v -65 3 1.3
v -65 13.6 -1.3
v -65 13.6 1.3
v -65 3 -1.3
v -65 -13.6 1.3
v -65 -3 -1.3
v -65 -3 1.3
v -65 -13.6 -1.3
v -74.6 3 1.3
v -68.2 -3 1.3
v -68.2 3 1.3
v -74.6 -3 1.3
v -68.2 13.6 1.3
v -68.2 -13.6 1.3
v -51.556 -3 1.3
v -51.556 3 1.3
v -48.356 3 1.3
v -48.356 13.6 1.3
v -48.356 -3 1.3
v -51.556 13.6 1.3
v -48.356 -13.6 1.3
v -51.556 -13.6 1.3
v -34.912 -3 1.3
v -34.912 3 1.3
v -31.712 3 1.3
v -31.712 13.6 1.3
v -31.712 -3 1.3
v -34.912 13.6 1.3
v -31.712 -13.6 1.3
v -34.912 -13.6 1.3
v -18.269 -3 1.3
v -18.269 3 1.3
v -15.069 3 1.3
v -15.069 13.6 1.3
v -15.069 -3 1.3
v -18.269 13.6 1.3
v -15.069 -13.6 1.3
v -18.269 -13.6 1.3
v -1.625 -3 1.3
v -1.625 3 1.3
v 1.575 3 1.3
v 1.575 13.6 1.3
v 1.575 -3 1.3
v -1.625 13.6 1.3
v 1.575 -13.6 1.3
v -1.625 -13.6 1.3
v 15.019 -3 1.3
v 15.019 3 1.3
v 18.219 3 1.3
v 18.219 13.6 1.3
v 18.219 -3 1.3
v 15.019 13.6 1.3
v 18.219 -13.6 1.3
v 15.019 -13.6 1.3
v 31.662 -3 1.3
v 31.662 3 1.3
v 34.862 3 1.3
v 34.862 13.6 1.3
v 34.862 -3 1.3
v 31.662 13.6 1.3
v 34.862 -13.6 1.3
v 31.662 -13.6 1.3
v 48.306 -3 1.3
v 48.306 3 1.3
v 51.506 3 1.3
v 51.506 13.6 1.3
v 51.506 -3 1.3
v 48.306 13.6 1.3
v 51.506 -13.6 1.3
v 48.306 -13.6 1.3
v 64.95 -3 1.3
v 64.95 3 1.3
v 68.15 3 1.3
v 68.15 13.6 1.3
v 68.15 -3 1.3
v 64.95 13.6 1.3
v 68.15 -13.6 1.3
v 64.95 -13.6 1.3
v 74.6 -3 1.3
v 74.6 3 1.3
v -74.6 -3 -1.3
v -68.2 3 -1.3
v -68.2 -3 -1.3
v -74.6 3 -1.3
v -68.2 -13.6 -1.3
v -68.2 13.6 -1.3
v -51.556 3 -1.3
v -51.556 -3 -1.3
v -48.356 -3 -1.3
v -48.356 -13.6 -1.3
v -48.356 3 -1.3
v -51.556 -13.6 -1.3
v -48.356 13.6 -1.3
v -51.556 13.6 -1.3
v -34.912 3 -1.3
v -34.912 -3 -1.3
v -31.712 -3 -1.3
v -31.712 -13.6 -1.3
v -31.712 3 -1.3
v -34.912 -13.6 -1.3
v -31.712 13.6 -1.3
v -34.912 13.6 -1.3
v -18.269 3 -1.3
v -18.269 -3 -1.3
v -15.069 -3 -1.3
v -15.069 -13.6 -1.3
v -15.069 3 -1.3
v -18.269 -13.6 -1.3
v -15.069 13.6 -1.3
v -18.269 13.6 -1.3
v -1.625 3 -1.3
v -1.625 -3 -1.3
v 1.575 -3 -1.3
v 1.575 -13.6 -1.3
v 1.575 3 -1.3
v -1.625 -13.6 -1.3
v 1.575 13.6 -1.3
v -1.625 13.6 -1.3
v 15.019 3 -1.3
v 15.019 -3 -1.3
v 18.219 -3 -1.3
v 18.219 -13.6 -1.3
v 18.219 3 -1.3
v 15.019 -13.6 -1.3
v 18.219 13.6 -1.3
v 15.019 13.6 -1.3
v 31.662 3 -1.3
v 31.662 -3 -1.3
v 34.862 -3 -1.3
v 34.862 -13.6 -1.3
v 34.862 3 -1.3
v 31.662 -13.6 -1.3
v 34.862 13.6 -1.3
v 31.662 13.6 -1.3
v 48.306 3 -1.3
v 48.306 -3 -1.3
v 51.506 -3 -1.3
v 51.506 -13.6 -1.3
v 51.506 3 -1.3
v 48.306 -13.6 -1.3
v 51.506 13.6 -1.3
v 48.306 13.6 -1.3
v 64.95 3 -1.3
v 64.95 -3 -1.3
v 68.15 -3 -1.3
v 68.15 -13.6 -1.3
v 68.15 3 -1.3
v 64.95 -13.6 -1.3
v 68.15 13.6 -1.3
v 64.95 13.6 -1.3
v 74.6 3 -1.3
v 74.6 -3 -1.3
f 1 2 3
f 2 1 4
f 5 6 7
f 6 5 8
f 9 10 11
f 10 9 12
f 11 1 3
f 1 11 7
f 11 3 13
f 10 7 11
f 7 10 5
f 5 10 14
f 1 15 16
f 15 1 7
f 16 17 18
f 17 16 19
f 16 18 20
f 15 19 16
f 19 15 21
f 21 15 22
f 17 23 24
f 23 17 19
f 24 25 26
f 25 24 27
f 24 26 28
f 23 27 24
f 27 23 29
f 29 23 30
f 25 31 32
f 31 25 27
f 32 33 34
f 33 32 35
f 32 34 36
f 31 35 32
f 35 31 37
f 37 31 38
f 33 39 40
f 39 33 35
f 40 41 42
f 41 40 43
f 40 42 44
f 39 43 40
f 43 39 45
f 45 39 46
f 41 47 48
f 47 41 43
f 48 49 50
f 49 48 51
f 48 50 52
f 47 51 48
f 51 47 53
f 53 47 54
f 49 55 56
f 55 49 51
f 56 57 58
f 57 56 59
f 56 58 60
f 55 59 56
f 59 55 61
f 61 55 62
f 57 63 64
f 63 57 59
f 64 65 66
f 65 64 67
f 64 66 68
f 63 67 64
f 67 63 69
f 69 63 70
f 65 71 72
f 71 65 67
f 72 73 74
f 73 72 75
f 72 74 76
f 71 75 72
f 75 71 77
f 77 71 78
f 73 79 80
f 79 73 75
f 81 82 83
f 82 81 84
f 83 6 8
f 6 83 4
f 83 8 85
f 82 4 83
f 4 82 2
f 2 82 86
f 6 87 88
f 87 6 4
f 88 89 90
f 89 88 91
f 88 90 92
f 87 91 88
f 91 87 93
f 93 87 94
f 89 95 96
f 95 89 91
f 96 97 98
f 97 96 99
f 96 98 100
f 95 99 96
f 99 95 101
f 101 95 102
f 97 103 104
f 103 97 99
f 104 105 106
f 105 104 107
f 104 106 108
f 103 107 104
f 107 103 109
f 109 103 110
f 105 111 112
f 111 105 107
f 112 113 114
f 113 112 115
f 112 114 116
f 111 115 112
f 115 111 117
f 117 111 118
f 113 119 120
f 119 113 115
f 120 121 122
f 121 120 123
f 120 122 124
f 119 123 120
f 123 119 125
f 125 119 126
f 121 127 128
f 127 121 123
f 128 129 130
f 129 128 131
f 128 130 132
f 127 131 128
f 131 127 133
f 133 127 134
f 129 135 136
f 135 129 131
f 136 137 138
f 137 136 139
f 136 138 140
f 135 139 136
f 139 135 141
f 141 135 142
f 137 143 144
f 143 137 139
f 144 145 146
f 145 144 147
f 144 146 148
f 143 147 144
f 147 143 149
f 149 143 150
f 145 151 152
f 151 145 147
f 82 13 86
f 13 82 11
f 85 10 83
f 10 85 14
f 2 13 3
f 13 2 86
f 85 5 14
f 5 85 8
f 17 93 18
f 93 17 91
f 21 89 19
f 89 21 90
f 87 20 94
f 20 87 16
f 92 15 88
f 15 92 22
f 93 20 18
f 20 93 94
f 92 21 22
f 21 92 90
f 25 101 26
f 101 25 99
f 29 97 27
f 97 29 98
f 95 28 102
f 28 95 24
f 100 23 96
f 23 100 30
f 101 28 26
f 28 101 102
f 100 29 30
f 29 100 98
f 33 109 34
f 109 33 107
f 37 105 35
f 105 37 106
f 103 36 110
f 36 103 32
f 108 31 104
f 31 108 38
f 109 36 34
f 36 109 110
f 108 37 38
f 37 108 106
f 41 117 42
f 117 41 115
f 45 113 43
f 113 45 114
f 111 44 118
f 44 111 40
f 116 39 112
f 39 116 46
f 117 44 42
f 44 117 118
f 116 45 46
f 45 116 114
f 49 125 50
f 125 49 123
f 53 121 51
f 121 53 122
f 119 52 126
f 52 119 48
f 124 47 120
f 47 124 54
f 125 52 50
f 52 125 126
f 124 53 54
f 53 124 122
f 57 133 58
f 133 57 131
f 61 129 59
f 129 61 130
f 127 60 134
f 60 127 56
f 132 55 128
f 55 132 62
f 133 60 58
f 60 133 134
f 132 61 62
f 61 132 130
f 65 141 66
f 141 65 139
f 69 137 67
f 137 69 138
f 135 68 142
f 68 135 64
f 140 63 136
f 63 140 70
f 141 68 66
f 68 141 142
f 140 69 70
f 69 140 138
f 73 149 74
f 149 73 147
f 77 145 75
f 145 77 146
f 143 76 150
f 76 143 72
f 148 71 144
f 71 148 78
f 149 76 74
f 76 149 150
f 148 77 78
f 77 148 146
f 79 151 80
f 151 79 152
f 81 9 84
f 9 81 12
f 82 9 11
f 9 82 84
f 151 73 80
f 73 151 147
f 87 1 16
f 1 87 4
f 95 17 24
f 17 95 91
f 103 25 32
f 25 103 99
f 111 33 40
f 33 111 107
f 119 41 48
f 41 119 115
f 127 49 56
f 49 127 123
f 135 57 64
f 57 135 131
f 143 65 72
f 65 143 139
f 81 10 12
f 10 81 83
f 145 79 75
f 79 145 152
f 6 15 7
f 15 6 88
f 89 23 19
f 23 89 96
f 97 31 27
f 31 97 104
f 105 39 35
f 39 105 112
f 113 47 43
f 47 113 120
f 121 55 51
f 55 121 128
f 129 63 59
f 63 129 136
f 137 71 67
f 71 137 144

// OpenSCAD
// Long slender rail with evenly spaced perpendicular tabs (flat plate)
// Target bounding box: 149.2 x 27.2 x 2.6 mm

// Overall bounding box
L = 149.2;   // length (X)
W = 27.2;    // overall width across tabs (Y)
T = 2.6;     // thickness (Z)

// Spine and tab geometry
spine_w = 6.0;   // spine width (Y)
tab_x   = 3.0;   // tab thickness along length (X)

// Tab layout
end_margin = 8.0;      // from each end to first/last tab center
tab_pitch  = 16.64375; // spacing between tab centers
tab_count  = 9;        // number of tabs

// Small overlap to guarantee watertight union
eps = 0.2;

// Derived checks/placements (formula-based)
first_tab_x = -L/2 + end_margin;
last_tab_x  = first_tab_x + (tab_count - 1) * tab_pitch;

// Base shapes
module spine_bar() {
    cube([L, spine_w, T], center=true);
}

module tab_at_x(xpos) {
    // Symmetric about spine centerline in Y; overlaps spine in X by eps
    translate([xpos, 0, 0])
        cube([tab_x + eps, W, T], center=true);
}

// Final model (single connected solid)
union() {
    spine_bar();

    for (i = [0 : tab_count - 1]) {
        tab_at_x(first_tab_x + i * tab_pitch);
    }
}
